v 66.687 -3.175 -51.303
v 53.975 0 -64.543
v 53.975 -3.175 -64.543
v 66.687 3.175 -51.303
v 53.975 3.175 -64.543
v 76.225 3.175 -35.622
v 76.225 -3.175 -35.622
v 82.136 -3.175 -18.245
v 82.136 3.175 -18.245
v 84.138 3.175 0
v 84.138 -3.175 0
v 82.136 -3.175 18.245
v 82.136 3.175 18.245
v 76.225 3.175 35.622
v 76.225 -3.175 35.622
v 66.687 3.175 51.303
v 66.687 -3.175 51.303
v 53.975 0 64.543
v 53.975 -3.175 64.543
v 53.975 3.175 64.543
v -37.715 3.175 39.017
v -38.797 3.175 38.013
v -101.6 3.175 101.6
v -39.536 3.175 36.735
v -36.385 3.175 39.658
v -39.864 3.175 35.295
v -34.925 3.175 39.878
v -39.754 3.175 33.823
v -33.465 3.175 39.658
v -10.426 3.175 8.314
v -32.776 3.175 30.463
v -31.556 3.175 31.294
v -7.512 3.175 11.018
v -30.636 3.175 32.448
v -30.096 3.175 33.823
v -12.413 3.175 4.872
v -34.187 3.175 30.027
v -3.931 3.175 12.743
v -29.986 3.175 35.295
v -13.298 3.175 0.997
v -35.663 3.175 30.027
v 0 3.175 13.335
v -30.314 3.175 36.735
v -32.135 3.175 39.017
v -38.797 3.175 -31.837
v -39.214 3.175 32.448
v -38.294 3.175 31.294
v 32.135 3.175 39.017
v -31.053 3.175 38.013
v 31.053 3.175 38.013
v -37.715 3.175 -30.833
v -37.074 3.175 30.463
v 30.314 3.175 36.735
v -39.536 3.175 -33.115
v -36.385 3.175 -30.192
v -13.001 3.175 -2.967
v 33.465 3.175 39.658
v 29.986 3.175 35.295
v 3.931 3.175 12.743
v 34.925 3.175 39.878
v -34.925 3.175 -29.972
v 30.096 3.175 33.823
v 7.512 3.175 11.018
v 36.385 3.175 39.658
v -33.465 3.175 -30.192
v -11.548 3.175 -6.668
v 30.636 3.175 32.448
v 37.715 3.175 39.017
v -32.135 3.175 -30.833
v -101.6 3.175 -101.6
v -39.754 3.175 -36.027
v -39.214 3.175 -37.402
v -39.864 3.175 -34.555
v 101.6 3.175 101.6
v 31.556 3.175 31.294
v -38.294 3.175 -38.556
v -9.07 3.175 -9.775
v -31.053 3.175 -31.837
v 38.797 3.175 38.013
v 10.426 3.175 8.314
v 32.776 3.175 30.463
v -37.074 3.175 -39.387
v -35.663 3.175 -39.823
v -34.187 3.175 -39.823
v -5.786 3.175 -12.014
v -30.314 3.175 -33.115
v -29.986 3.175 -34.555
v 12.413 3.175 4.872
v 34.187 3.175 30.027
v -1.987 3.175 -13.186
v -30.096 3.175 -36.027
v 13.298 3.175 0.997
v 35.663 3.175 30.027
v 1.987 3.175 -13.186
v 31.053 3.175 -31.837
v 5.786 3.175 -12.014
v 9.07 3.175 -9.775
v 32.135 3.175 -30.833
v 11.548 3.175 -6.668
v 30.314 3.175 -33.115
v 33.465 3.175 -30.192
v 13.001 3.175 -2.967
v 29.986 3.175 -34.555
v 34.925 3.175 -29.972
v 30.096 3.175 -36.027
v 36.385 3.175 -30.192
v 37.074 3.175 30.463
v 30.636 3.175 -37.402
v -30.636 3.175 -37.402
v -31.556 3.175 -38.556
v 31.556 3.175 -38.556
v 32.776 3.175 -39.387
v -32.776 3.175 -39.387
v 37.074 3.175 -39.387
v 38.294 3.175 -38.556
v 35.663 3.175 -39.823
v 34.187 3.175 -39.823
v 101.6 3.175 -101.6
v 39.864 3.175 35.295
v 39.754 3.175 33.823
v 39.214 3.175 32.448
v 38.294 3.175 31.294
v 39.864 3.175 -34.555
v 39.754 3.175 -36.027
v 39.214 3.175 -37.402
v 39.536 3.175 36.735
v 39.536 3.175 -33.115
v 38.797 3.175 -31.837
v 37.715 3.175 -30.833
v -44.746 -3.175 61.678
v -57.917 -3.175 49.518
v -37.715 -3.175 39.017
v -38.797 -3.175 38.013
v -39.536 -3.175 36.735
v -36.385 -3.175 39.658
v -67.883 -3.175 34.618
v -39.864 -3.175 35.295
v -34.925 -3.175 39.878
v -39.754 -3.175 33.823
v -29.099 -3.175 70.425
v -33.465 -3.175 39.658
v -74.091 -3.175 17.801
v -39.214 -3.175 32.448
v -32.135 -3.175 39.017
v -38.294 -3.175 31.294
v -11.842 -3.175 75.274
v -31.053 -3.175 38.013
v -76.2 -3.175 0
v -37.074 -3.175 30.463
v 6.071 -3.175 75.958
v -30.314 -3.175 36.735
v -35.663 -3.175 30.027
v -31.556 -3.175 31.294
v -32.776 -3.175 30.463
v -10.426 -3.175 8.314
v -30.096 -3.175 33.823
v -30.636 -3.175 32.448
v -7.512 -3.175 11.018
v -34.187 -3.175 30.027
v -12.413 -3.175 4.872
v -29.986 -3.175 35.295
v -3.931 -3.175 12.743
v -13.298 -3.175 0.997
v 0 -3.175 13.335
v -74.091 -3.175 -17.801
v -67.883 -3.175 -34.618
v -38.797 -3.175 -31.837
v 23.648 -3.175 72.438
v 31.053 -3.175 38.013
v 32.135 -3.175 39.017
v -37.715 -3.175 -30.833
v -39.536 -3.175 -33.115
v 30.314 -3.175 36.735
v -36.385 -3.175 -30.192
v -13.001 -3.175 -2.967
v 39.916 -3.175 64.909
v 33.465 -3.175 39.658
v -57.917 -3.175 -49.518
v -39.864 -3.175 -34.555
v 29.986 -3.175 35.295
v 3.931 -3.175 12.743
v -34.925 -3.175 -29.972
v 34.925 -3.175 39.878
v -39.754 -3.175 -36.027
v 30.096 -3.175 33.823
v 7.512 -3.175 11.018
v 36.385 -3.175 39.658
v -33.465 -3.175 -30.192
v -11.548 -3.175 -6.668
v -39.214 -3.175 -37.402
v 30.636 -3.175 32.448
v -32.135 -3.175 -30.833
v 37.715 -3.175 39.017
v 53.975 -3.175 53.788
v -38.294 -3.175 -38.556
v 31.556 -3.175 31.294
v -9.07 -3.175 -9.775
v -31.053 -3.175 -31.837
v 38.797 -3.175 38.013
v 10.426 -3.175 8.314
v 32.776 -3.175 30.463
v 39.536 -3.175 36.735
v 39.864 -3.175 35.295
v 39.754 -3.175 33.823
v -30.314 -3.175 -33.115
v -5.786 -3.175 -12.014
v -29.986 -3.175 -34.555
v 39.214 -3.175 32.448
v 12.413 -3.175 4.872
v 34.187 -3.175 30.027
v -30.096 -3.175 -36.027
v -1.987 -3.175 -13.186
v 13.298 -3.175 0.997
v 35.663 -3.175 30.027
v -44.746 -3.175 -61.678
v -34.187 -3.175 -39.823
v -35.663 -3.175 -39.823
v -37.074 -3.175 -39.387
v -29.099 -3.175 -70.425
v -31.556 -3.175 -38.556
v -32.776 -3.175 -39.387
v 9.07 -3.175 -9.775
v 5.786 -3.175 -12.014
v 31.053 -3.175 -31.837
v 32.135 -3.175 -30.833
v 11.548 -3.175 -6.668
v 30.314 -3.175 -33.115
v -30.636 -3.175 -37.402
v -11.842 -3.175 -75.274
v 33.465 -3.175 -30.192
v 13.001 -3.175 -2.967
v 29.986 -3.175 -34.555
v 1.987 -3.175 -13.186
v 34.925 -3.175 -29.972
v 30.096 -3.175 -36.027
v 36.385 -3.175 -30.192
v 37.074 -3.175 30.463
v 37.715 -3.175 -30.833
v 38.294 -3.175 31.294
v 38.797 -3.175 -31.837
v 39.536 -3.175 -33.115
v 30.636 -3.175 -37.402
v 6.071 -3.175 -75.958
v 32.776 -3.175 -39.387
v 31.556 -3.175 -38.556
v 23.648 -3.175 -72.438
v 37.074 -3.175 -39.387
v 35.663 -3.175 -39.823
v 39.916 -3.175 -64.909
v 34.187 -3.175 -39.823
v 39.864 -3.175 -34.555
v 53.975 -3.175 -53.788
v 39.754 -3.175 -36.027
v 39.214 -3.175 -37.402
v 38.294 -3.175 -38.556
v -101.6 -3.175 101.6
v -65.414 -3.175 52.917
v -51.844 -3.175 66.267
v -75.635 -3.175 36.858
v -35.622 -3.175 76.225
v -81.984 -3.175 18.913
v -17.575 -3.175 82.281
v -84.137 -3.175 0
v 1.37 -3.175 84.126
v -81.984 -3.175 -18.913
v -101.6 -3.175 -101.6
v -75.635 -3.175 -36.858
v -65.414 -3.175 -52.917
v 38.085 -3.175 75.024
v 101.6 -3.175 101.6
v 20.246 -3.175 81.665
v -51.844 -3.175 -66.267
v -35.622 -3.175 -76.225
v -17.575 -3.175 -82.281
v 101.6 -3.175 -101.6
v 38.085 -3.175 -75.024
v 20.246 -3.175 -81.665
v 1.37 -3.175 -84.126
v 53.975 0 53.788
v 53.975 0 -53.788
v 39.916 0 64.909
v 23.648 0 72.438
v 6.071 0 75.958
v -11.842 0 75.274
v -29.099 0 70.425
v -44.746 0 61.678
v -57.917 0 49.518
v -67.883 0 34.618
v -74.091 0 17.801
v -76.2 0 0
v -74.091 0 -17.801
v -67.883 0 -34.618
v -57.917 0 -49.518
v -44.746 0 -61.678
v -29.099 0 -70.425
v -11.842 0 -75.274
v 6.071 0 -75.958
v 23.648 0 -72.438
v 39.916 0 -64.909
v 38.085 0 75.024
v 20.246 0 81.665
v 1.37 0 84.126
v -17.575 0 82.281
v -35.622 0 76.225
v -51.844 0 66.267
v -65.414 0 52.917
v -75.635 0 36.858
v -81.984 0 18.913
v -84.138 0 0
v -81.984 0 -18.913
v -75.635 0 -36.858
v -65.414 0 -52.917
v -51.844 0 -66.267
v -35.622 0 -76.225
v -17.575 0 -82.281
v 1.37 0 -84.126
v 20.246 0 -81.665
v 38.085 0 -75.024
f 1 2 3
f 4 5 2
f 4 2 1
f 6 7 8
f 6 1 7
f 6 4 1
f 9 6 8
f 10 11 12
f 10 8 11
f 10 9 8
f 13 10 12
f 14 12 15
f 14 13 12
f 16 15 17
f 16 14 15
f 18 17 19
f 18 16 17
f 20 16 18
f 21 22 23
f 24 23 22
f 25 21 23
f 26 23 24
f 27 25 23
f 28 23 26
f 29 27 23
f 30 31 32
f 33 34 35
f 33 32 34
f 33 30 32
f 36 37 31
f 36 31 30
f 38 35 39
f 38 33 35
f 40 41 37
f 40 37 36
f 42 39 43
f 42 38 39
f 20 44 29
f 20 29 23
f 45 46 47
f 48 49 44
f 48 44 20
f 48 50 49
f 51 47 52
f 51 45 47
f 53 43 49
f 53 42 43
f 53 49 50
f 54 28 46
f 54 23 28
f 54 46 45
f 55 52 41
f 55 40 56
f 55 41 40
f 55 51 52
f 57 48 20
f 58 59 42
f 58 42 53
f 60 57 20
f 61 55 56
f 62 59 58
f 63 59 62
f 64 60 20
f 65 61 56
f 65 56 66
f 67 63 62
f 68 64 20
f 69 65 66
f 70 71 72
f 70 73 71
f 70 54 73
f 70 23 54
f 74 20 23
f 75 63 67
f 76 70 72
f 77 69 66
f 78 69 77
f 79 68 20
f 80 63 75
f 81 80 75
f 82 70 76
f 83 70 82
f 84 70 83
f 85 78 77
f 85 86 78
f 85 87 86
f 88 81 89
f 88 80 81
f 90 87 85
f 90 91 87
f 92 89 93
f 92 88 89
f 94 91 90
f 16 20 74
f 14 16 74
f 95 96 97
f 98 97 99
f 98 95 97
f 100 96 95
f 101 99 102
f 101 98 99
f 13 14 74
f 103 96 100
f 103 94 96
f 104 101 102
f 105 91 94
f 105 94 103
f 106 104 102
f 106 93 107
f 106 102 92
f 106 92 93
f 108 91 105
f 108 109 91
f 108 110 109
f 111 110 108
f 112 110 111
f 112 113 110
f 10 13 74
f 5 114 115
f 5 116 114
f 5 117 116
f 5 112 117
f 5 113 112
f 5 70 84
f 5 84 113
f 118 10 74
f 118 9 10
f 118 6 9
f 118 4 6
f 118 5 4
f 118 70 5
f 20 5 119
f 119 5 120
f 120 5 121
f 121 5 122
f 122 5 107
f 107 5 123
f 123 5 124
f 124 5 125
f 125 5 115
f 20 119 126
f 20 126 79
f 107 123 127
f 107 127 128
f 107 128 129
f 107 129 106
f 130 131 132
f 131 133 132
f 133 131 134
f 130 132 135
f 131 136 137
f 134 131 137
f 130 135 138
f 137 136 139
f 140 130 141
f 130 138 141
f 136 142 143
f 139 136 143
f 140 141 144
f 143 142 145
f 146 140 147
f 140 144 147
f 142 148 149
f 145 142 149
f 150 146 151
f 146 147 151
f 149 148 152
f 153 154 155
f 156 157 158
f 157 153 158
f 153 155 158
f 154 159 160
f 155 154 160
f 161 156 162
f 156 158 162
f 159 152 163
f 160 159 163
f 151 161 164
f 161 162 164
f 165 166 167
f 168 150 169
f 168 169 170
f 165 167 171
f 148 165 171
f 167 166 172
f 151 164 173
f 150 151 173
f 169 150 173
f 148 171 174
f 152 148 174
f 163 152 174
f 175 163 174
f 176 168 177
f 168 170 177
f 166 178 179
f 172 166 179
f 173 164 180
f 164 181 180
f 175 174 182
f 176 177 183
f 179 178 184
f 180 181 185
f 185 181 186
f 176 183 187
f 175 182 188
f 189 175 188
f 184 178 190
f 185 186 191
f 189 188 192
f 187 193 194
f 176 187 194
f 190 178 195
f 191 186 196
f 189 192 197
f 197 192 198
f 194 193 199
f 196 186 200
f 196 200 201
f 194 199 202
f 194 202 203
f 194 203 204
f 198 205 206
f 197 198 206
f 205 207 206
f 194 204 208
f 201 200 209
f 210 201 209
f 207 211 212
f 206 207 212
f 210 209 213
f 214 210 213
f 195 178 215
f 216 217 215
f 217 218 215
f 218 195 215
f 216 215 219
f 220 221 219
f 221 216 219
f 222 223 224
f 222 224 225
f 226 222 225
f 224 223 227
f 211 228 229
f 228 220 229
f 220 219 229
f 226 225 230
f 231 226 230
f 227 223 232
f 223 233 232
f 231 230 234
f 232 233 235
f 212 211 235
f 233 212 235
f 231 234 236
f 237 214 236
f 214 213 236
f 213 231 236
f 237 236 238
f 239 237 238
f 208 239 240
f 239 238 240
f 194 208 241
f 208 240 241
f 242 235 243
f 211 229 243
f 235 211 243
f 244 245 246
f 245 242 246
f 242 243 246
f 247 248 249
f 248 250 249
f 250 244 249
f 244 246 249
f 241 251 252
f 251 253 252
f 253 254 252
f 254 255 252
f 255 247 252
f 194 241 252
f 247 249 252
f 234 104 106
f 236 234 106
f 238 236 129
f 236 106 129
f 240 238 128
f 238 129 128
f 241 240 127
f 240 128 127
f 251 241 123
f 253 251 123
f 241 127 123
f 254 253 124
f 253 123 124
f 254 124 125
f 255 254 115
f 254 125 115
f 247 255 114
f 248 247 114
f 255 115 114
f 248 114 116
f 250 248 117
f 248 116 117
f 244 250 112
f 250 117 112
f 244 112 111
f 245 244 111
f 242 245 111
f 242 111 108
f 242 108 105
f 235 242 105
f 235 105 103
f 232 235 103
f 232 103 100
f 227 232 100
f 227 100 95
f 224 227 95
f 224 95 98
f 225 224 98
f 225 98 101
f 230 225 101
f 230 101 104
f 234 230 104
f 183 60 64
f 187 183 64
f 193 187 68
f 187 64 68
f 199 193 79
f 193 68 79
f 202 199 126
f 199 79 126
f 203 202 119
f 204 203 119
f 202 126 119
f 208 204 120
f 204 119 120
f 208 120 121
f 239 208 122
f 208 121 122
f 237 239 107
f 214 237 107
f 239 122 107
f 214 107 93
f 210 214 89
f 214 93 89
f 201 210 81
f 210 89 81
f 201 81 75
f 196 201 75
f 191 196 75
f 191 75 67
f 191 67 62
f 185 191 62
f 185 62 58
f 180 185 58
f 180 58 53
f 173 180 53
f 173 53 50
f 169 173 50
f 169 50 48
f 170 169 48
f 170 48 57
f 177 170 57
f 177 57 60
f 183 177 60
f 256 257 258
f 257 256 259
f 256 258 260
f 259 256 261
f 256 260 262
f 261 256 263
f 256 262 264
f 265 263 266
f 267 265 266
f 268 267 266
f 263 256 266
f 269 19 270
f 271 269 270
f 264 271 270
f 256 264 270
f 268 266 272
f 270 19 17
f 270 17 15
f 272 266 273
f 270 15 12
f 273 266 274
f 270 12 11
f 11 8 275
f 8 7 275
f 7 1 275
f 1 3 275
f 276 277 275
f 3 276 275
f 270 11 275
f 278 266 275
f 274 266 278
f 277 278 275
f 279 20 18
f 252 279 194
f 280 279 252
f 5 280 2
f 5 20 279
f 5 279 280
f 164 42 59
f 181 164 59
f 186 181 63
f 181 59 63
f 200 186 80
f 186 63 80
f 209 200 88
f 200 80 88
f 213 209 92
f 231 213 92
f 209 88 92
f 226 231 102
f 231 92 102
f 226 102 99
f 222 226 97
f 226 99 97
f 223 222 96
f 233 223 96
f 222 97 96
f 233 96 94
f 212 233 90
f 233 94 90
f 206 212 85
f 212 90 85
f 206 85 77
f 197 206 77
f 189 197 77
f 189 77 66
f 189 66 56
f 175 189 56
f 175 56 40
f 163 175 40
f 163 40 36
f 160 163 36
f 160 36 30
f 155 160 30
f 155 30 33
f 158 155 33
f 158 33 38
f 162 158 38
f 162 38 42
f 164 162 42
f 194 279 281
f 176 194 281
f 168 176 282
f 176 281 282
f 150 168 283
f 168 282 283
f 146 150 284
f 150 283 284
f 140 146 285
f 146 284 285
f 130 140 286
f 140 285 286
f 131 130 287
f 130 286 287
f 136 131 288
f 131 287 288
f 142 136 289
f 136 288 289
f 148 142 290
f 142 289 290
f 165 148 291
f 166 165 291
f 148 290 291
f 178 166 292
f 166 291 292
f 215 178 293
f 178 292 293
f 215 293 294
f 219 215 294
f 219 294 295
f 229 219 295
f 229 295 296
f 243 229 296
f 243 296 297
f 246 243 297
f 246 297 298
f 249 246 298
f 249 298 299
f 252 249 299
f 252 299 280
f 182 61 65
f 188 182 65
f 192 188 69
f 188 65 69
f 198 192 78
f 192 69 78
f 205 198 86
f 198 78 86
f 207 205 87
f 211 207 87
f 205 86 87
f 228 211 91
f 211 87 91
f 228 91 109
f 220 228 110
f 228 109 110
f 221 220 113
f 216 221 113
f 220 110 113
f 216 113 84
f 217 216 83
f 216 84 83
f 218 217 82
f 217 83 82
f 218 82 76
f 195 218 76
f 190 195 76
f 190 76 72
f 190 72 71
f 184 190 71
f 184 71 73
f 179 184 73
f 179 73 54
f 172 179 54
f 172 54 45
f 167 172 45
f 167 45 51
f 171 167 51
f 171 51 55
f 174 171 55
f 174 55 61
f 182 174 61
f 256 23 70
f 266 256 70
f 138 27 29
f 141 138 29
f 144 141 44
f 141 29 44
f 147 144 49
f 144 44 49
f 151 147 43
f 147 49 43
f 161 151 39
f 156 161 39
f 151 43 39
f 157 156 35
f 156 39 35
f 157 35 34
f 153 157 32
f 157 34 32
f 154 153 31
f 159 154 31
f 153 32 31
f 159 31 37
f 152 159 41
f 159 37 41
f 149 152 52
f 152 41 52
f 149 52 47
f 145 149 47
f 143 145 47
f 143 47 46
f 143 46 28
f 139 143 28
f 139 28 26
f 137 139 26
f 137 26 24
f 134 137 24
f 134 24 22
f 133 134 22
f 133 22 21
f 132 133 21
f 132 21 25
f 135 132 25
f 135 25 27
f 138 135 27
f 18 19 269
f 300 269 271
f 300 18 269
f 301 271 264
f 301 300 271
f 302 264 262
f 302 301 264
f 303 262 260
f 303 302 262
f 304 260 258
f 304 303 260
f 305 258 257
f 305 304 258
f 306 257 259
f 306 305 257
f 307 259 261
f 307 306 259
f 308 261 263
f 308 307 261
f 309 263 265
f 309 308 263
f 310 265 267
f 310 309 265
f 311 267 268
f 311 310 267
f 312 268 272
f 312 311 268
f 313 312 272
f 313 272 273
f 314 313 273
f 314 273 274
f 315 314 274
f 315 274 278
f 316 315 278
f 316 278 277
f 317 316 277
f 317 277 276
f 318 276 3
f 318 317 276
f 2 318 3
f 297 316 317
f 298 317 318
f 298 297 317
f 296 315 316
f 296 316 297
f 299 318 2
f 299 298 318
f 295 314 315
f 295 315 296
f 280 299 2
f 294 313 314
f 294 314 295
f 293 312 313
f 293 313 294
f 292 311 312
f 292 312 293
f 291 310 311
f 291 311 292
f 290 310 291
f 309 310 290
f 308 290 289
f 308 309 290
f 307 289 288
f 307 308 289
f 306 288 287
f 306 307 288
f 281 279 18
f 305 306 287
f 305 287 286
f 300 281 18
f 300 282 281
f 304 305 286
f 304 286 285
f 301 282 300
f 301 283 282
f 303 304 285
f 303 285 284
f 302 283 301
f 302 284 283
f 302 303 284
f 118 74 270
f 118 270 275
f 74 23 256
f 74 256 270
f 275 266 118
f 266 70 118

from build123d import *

# Parameters (mm, degrees)
SKETCH1_W           = 203.2
SKETCH1_H           = 203.2
BOSS_EXTRUDE1_DEPTH = 3.175
CUT_EXTRUDE1_DEPTH  = 6.35
SKETCH3_R           = 4.953
SKETCH3_R_2         = 13.335
CUT_EXTRUDE2_DEPTH  = 12.7
CUT_EXTRUDE3_START  = -3.175
SKETCH4_R           = 84.1375
SKETCH4_R_2         = 76.2
CUT_EXTRUDE3_DEPTH  = 3.175


with BuildPart() as part:
    # Sketch1 → Boss-Extrude1 (new, symmetric)
    with BuildSketch(Plane(origin=(0, 0, 0), x_dir=(1, 0, 0), z_dir=(0, 1, 0))):
        Rectangle(SKETCH1_W, SKETCH1_H)
    extrude(amount=BOSS_EXTRUDE1_DEPTH, both=True)

    # Sketch2 → Cut-Extrude1 (cut, symmetric)
    with BuildSketch(Plane(origin=(0, 0, 0), x_dir=(1, 0, 0), z_dir=(0, 1, 0))):
        with BuildLine():
            Line((53.975, -64.543150537), (53.975, 64.543150537))
            ThreePointArc((53.975, 64.543150537), (84.1375, 0), (53.975, -64.543150537))
        make_face()
    extrude(amount=CUT_EXTRUDE1_DEPTH, both=True, mode=Mode.SUBTRACT)

    # Sketch3 → Cut-Extrude2 (cut)
    with BuildSketch(Plane(origin=(0, 3.175, 0), x_dir=(1, 0, 0), z_dir=(0, 1, 0))):
        with Locations(Location((-34.925, -34.925, 0), (0, 0, 270))):
            Circle(SKETCH3_R)
        with Locations(Location((-34.925, 34.925, 0), (0, 0, 270))):
            Circle(SKETCH3_R)
        with Locations(Location((34.925, 34.925, 0), (0, 0, 270))):
            Circle(SKETCH3_R)
        with Locations(Location((34.925, -34.925, 0), (0, 0, 270))):
            Circle(SKETCH3_R)
        with Locations(Location((0, 0, 0), (0, 0, 270))):
            Circle(SKETCH3_R_2)
    extrude(amount=-CUT_EXTRUDE2_DEPTH, mode=Mode.SUBTRACT)

    # Sketch4 → Cut-Extrude3 (cut)
    with BuildSketch(Plane.XZ.offset(3.175).offset(CUT_EXTRUDE3_START)):
        with Locations(Location((0, 0, 0), (0, 0, 50.095533509))):
            Circle(SKETCH4_R)
        Circle(SKETCH4_R_2, mode=Mode.SUBTRACT)
    extrude(amount=CUT_EXTRUDE3_DEPTH, mode=Mode.SUBTRACT)


solid = part.part
